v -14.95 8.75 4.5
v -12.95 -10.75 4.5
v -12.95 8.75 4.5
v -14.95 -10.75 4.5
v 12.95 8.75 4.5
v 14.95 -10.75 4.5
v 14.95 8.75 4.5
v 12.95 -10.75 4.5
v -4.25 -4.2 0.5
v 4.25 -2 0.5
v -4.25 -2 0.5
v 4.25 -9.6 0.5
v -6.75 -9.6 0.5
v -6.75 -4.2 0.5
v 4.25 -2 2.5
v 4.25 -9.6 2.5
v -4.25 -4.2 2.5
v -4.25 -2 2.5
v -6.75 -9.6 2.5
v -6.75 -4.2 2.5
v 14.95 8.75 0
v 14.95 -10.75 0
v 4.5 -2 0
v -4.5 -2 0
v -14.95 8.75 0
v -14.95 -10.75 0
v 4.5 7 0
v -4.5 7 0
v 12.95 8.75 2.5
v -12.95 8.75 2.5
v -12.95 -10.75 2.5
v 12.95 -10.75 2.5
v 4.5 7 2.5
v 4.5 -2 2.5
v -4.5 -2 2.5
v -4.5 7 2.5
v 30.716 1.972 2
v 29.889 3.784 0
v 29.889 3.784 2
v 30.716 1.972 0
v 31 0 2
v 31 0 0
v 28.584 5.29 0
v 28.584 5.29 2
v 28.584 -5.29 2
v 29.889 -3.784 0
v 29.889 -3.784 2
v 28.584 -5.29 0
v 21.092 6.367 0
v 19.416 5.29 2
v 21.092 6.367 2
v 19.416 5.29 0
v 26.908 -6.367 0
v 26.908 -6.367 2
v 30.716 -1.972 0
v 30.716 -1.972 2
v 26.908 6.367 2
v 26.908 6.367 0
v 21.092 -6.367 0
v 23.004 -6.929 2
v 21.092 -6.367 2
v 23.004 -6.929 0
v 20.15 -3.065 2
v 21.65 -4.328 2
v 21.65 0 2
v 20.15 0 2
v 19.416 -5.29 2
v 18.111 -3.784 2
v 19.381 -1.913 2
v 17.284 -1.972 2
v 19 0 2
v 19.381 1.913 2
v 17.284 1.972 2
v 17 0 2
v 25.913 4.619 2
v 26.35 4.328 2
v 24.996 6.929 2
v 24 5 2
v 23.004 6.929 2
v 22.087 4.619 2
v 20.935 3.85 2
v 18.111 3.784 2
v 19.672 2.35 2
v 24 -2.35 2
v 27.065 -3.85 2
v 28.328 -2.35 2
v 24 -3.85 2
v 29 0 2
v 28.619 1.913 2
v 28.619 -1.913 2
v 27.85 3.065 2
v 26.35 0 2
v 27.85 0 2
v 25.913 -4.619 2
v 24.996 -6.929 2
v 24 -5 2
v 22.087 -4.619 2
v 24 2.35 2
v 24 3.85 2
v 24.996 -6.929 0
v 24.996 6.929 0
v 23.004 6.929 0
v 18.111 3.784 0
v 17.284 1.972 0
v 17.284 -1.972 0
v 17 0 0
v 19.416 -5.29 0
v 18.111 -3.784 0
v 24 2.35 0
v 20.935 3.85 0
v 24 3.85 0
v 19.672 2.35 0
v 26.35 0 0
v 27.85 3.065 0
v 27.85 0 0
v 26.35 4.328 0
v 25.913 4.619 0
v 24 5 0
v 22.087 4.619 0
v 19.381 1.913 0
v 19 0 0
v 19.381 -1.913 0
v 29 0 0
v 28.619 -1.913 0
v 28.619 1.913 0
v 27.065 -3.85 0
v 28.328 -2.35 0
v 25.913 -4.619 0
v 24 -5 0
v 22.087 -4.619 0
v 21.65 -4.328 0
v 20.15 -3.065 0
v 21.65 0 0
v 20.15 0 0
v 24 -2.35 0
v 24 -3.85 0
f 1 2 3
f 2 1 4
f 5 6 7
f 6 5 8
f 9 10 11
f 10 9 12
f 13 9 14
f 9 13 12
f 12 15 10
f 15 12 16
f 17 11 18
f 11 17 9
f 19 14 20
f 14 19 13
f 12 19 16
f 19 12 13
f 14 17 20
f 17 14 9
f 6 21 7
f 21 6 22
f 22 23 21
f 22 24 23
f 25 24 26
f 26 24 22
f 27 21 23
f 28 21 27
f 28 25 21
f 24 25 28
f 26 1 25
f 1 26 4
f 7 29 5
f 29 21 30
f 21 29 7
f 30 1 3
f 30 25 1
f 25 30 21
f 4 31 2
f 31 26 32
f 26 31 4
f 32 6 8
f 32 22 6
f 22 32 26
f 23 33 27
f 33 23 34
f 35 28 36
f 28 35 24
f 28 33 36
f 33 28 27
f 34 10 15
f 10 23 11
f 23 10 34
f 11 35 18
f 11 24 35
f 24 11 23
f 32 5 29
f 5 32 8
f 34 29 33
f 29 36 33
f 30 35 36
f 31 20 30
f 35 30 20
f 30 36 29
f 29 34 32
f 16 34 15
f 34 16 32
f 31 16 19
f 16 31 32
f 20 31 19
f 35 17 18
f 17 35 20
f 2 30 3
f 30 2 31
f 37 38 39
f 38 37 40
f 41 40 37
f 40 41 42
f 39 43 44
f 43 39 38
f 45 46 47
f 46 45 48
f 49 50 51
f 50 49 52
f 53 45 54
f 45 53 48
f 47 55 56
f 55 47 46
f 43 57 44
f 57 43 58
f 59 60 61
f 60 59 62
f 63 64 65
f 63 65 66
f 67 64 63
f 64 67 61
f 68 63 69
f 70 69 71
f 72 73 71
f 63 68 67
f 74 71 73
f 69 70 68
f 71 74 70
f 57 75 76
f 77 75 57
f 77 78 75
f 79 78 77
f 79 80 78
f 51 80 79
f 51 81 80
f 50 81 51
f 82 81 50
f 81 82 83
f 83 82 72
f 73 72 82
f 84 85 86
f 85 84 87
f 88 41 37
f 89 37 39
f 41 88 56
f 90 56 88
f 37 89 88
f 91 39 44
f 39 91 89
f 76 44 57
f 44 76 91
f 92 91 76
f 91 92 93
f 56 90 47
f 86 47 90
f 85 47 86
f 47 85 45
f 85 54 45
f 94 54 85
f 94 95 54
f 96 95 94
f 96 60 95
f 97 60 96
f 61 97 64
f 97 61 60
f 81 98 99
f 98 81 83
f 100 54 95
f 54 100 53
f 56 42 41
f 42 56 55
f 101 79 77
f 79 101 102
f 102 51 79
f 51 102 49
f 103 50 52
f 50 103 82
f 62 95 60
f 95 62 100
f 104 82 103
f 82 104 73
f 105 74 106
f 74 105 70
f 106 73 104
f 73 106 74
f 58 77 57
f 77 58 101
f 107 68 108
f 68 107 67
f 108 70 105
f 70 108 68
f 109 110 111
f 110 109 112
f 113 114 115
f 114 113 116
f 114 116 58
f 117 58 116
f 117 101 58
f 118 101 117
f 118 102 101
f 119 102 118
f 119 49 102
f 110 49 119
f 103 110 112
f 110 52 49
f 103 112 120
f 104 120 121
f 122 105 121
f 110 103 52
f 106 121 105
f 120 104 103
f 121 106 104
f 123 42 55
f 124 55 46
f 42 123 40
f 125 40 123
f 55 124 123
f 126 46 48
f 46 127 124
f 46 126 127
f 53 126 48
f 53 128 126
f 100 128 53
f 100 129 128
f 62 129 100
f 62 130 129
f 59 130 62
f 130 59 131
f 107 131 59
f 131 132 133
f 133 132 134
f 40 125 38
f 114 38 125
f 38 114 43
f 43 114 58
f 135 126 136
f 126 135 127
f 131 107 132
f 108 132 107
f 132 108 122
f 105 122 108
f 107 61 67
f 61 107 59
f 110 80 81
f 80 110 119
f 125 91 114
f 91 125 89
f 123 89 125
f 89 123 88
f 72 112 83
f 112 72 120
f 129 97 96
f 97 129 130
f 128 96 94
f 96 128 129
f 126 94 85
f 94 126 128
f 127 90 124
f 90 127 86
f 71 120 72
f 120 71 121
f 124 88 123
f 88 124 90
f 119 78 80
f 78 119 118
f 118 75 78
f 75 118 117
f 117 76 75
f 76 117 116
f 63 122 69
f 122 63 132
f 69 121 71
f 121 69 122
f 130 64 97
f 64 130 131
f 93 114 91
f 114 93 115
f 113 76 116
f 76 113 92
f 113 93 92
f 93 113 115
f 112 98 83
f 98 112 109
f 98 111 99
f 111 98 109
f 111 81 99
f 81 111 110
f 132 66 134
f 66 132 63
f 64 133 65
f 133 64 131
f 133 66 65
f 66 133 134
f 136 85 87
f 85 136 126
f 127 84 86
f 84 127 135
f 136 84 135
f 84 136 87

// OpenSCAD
/******************************************************************
*                                                                 *
* OpenFlexure Microscope: Tools to help remove the pi camera lens *
*                                                                 *
* This is part of the OpenFlexure microscope, an open-source      *
* microscope and 3-axis translation stage.  It gets really good   *
* precision over a ~10mm range, by using plastic flexure          *
* mechanisms.                                                     *
*                                                                 *
* (c) Richard Bowman, January 2016                                *
* Released under the CERN Open Hardware License                   *
*                                                                 *
******************************************************************/

use <utilities.scad>;

d=0.05;

pcb = [25.4+0.5,24+0.5,2]; //size of the picam PCB (+0.5mm so it fits)
camera_housing = [9,9,2.5]; //size of the plastic housing
camera_housing_y = 2.5; //shift of the camera housing from the centre
lens_unscrew_r = 5.5/2; //size of the bit we unscrew
    
module generous_camera_bits(){
    //The other stuff on the PCB (mostly the ribbon cable)
    camera = [8.5,8.5,2.3]; //size of camera box
	cw = camera[0]+1; //side length of camera box at bottom (slightly larger)
	union(){
		//ribbon cable at top of camera
        sequential_hull(){
            translate([0,0,0]) cube([cw-1,d,4],center=true);
            translate([0,9.4-(4.4/1)/2,0]) cube([cw-1,1,4],center=true);
        }
        //flex connector
        translate([-1.25,9.4,0]) cube([cw-1+2.5, 4.4+1, 4],center=true);
        
	}
}

module picam2_gripper(){
    // this little bit of plastic grips the plastic camera housing
    // and allows you to safely unscrew the lens
    // it protects the (surprisingly delicate) flex that connects the camera to the PCB.
    outer = pcb+[4,-5,camera_housing[2]]; //size of the tool
    difference(){
        translate([0,-1,outer[2]/2]) cube(outer, center=true);
        
        //central hole for the camera housing
        translate([0,camera_housing_y,0]) cube(camera_housing + [0,0,999],center=true);
        
        //cut-outs for the other bits (cable etc.)
        translate([0,camera_housing_y,camera_housing[2]]) rotate([180,0,0]) generous_camera_bits();
        
        //indent for PCB
        translate([0,0,outer[2]]) cube(pcb + [0,0,pcb[2]],center=true);
    
    }
}

module picam_lens_gripper(){
    //a tool to unscrew the lens from the pi camera
    inner_r = 4.7/2;
    union(){
        difference(){
            cylinder(r=7,h=2);
            cylinder(r=5,h=999,center=true);
        }
        for(a=[0,90,180,270]) rotate(a) translate([inner_r,0,0]) cube([1.5,5,2]);
    }
}

//translate([pcb[0]/2+15,pcb[1]/2,0]) 
picam2_gripper();
//picam_lens_pliers();
translate([24,0,0]) picam_lens_gripper();
